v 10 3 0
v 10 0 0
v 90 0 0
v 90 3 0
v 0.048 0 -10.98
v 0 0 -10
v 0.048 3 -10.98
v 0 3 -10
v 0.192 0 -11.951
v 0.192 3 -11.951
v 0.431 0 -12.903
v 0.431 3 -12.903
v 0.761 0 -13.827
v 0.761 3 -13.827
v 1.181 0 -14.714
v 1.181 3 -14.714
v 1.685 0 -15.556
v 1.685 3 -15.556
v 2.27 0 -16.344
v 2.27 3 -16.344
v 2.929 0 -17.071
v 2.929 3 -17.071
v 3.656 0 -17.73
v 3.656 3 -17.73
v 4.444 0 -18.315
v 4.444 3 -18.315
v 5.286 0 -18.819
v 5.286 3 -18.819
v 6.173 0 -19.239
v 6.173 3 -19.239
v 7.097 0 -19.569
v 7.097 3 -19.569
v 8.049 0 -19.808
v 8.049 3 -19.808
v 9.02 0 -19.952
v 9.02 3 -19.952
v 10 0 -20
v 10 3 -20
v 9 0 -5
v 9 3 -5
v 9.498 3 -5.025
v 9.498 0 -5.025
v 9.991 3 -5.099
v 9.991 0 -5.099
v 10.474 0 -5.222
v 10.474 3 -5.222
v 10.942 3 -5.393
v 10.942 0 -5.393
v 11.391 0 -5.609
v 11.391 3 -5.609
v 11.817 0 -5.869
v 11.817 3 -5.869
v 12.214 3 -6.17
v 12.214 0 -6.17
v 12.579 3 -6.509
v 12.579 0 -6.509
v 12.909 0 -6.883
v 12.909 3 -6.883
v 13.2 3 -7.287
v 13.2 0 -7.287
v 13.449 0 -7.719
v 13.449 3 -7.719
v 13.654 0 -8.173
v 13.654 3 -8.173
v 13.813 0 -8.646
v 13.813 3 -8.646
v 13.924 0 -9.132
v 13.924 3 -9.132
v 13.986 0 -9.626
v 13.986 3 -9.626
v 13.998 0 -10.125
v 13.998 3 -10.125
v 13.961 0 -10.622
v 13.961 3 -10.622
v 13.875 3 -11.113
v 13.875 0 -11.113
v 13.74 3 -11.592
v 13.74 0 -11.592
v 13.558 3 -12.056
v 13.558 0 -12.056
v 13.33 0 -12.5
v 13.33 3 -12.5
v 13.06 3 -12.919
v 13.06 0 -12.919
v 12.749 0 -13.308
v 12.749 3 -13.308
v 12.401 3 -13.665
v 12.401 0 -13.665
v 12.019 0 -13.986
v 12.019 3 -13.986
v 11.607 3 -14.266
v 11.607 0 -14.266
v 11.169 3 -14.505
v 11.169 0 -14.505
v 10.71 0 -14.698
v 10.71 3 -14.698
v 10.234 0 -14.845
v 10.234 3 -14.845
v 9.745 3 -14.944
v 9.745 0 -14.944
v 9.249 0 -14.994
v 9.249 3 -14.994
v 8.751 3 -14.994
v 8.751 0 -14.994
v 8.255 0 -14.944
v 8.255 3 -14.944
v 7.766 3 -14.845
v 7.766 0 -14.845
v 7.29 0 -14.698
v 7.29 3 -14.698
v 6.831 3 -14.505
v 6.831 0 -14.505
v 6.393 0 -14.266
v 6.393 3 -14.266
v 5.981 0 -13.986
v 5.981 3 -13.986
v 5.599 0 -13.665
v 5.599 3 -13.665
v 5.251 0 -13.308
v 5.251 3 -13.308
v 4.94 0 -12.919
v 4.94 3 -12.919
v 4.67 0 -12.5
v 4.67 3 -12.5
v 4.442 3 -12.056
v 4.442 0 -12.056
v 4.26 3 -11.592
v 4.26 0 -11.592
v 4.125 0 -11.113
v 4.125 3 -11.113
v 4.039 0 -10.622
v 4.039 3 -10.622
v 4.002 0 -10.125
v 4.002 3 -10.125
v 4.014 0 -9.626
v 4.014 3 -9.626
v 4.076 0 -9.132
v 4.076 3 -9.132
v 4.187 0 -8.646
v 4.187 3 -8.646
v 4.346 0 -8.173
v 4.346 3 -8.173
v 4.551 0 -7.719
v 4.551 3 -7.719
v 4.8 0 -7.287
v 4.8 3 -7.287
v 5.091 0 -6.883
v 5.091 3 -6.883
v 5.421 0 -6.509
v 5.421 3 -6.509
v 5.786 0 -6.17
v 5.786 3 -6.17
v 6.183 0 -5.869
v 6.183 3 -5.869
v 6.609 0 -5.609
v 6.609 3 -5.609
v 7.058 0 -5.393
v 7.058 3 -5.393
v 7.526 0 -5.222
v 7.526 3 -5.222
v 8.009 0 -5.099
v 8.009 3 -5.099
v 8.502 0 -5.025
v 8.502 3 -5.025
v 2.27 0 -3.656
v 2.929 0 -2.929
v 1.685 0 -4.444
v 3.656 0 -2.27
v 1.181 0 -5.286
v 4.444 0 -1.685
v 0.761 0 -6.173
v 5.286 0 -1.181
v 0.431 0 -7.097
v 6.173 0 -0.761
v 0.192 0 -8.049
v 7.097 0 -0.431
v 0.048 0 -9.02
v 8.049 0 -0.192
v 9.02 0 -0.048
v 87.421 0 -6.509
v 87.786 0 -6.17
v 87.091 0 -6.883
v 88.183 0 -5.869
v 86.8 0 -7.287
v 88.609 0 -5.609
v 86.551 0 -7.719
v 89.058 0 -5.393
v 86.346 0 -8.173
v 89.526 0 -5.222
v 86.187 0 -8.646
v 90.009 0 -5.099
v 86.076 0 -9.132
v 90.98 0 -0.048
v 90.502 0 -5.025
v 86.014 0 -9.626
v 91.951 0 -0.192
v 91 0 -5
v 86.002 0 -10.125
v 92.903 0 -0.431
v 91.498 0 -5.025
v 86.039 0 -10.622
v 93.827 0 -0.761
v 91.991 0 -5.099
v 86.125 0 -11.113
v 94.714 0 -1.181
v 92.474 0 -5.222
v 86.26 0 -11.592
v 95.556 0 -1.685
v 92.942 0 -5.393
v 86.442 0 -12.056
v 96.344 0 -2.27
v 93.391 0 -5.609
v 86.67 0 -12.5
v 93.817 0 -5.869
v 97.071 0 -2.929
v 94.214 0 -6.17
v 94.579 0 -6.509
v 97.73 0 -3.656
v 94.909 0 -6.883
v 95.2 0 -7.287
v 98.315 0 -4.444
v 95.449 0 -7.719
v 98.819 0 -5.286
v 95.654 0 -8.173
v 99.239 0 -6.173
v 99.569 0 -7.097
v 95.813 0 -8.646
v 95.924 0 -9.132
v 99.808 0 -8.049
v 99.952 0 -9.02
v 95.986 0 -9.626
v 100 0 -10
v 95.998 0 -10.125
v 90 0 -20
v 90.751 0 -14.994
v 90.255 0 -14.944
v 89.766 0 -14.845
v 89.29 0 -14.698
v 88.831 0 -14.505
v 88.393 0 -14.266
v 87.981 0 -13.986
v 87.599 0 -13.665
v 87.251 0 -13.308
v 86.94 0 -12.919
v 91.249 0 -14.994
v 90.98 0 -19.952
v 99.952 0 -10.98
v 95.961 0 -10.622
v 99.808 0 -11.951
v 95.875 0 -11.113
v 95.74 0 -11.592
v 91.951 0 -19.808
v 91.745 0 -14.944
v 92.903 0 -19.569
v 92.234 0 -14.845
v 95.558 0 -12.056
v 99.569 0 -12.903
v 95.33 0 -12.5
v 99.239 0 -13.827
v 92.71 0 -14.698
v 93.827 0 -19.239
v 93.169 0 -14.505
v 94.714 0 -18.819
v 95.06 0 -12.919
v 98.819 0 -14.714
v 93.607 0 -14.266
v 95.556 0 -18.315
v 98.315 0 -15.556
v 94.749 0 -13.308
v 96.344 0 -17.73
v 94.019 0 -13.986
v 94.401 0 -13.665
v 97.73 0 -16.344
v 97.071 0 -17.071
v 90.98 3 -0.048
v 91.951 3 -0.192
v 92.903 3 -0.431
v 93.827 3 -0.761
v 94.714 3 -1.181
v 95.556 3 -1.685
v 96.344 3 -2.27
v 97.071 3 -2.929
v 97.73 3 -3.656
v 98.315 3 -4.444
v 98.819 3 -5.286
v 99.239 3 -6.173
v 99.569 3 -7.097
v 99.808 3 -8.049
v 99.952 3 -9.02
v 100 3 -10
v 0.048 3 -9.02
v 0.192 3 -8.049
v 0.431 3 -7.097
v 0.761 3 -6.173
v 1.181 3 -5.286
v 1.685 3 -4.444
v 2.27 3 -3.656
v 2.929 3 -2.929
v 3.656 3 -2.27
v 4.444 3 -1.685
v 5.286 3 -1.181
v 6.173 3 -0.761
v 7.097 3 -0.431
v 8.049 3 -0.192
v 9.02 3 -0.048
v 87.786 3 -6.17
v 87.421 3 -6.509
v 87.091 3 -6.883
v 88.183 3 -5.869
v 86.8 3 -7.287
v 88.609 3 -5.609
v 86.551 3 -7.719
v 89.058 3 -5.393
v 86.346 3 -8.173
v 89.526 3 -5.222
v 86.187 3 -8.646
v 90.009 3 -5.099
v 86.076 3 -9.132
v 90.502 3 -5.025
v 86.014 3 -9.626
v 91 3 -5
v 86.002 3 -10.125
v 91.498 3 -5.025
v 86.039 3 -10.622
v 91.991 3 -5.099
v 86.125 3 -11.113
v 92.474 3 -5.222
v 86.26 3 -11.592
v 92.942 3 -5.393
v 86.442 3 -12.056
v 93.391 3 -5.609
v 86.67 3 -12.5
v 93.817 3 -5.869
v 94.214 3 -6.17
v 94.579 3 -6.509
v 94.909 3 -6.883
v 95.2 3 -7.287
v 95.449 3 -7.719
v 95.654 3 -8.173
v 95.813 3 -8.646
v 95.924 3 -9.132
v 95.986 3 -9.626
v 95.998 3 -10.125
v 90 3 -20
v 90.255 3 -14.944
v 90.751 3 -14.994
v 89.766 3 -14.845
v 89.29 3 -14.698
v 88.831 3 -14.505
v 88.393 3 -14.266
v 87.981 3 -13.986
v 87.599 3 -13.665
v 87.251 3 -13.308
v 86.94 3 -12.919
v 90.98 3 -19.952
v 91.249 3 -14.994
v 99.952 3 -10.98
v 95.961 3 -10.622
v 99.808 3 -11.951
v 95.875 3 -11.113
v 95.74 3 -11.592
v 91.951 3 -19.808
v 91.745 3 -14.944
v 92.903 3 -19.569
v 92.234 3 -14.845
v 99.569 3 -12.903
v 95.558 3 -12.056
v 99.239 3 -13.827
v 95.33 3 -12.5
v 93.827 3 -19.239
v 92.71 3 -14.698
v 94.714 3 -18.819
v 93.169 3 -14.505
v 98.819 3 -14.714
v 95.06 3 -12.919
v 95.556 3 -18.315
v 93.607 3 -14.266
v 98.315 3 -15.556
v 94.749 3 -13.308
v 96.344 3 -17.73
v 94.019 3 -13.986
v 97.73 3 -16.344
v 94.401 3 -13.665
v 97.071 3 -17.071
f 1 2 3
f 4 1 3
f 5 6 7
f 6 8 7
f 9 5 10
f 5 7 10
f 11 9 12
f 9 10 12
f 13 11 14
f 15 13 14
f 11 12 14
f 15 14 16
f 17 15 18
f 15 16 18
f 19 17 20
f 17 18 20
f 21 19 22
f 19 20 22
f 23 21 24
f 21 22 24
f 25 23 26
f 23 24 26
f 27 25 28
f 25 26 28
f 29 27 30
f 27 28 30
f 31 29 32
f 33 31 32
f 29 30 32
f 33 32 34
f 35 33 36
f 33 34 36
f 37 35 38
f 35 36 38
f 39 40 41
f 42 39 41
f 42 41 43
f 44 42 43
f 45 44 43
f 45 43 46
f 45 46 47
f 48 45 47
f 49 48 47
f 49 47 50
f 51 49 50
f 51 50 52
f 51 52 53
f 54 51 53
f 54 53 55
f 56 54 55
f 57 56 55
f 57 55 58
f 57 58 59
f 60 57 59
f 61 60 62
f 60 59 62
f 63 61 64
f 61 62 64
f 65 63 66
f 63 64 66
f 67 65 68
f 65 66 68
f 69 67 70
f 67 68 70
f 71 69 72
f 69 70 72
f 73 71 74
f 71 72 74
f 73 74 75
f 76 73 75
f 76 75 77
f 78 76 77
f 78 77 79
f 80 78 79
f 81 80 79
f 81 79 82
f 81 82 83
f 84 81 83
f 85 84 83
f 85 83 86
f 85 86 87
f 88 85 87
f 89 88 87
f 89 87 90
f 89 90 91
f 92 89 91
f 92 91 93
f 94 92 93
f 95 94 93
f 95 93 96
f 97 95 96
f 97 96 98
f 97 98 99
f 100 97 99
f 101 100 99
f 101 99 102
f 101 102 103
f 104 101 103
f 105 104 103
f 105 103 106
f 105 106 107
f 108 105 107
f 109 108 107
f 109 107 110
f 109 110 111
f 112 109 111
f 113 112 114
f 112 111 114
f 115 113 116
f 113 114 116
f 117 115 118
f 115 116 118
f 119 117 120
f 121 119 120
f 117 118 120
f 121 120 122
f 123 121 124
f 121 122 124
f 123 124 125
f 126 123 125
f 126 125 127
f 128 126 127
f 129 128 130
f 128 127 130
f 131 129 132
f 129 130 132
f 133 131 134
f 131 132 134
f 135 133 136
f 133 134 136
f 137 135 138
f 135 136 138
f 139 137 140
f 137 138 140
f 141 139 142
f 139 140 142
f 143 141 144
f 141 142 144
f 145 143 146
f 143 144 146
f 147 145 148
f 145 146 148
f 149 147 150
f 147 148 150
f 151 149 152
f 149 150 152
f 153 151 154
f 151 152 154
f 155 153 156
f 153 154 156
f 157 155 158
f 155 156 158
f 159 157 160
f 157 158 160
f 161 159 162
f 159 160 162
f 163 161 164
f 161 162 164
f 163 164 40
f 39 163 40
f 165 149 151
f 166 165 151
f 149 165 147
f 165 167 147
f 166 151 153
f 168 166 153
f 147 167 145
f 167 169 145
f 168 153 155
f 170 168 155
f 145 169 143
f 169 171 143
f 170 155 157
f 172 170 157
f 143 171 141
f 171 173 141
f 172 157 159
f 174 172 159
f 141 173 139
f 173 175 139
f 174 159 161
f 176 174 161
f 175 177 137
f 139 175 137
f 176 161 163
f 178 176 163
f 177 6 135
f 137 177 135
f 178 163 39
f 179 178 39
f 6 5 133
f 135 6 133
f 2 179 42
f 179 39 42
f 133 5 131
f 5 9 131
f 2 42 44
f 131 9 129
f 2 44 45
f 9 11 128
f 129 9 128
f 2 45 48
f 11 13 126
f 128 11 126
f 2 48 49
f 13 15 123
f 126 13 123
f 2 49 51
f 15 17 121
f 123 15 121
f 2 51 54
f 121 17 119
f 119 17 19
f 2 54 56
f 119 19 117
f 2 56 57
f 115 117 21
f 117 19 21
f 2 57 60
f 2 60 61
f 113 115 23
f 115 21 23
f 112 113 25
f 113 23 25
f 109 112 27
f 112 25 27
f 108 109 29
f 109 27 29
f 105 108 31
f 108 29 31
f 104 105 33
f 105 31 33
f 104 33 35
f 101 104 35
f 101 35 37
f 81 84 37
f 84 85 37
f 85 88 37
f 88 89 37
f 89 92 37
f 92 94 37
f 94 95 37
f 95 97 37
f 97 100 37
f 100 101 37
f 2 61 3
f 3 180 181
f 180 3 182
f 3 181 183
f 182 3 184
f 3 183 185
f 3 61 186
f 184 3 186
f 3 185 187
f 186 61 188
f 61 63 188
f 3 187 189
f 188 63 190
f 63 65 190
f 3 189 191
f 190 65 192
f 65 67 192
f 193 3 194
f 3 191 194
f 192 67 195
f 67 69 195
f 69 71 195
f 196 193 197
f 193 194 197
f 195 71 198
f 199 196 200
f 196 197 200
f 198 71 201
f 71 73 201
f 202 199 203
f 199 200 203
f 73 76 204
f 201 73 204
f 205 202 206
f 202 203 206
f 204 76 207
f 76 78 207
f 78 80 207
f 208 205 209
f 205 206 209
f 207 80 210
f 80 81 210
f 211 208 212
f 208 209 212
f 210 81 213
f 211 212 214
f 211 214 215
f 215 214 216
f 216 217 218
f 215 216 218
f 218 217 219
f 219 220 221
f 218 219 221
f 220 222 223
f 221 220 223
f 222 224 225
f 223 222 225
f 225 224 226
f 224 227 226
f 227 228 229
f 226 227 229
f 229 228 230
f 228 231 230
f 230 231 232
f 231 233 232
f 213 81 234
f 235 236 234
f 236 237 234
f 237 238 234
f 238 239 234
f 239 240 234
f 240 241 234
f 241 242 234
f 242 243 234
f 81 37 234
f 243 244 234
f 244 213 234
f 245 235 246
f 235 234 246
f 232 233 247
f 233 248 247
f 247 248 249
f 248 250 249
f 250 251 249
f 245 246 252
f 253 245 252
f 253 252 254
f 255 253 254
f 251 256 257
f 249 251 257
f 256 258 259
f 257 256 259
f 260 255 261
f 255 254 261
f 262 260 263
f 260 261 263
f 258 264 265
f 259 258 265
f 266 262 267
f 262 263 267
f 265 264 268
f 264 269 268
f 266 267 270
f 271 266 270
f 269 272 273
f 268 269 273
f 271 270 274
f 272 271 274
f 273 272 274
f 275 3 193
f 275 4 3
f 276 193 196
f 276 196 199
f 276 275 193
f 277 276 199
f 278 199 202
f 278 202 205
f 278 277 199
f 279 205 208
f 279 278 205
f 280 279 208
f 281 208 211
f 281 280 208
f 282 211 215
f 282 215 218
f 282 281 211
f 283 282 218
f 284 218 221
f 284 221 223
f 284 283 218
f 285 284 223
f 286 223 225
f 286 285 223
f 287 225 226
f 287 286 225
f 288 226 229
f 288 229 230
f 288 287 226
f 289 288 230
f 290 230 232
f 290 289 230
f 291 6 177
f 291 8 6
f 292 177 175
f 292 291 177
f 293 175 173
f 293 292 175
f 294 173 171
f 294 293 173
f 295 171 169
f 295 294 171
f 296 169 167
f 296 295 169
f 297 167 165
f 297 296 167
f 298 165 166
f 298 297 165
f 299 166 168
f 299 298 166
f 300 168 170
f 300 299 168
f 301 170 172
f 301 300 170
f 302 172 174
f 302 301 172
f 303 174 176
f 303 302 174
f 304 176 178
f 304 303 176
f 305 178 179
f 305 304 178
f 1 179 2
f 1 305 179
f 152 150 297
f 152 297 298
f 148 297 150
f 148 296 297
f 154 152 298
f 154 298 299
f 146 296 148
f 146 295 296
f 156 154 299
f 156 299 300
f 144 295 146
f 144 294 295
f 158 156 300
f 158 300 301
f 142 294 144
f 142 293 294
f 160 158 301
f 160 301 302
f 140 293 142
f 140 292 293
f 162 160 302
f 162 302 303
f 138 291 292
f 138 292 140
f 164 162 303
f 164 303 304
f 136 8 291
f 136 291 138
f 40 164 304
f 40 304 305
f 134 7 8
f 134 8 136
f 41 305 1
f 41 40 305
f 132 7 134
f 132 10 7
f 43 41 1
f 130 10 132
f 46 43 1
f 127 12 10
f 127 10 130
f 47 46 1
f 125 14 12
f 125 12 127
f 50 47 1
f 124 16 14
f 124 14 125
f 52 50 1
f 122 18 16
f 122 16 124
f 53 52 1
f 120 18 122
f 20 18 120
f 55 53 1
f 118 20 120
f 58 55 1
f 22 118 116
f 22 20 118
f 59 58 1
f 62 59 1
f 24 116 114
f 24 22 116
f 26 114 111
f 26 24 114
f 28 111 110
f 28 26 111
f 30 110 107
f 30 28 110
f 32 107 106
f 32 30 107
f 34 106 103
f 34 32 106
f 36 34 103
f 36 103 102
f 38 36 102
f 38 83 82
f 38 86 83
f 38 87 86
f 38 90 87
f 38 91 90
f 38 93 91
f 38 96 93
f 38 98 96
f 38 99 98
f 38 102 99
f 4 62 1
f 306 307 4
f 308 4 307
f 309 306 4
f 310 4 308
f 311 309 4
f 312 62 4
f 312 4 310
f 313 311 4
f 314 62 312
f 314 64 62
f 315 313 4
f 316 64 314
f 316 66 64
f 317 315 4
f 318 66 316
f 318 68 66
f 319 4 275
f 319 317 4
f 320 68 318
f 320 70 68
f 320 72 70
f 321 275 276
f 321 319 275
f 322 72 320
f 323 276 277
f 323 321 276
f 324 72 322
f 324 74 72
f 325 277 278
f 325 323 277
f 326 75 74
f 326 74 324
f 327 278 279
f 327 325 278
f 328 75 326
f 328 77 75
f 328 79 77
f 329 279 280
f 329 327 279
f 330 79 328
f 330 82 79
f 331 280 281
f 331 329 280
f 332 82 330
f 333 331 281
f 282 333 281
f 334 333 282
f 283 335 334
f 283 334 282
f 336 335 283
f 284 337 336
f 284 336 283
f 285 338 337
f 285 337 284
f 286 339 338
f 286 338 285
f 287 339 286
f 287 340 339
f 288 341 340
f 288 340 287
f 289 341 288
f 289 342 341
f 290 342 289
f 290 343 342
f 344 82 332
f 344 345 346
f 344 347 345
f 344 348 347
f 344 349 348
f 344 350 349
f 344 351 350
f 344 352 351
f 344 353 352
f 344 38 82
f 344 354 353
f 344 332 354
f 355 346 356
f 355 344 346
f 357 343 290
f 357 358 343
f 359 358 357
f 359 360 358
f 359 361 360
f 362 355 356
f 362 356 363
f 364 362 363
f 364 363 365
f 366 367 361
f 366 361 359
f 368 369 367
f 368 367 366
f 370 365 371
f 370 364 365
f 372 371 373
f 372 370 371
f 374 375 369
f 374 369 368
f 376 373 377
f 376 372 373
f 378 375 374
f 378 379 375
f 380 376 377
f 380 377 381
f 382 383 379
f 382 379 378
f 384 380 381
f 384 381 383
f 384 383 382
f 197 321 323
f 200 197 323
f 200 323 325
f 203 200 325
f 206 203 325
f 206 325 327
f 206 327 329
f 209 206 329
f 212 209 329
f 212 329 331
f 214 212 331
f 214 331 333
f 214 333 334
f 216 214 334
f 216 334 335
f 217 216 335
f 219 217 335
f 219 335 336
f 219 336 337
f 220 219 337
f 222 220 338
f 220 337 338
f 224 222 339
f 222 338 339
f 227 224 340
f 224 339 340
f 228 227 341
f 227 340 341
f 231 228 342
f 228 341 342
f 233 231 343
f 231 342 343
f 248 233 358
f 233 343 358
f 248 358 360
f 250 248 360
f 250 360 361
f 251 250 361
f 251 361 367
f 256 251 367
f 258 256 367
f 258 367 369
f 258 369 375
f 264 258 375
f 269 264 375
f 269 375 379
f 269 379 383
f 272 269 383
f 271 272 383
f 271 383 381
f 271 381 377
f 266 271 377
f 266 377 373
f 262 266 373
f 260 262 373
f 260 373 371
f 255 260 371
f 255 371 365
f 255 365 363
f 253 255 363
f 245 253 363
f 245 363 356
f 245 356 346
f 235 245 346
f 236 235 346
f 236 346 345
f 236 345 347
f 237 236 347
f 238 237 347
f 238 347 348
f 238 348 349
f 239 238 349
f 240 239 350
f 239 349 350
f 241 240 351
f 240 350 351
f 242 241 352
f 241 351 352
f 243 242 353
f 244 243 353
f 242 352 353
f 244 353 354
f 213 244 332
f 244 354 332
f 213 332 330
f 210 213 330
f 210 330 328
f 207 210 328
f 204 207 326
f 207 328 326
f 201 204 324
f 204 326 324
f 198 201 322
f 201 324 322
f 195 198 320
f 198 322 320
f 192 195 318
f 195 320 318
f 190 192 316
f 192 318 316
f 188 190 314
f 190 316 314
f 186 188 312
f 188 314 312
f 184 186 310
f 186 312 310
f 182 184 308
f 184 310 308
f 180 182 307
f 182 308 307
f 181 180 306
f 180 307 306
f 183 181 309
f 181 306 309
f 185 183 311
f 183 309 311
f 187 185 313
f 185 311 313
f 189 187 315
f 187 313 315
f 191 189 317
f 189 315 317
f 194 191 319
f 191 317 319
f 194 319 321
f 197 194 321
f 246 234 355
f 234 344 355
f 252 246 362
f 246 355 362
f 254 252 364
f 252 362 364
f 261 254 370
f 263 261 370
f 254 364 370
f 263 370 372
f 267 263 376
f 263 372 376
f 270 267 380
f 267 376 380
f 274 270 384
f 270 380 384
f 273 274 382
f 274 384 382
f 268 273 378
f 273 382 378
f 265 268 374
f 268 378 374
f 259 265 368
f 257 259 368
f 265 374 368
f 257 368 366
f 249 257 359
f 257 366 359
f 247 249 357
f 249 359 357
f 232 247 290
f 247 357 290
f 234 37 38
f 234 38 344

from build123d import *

# Parameters (mm, degrees)
SKETCH2_W           = 100
SKETCH2_H           = 20
BOSS_EXTRUDE1_DEPTH = 3
SKETCH3_R           = 5
CUT_EXTRUDE1_DEPTH  = 103.02450686
SKETCH4_R           = 5
CUT_EXTRUDE2_DEPTH  = 103.02450686
FILLET1_R           = 10
FILLET2_R           = 10


with BuildPart() as part:
    # Sketch2 → Boss-Extrude1 (new body)
    with BuildSketch(Plane(origin=(0, 0, 0), x_dir=(1, 0, 0), z_dir=(0, 1, 0))):
        with Locations((50, 10)):
            Rectangle(SKETCH2_W, SKETCH2_H)
    extrude(amount=BOSS_EXTRUDE1_DEPTH)

    # Sketch3 → Cut-Extrude1 (cut, through all)
    with BuildSketch(Plane(origin=(0, 3, 0), x_dir=(1, 0, 0), z_dir=(0, 1, 0))):
        with Locations(Location((9, 10, 0), (0, 0, 270))):
            Circle(SKETCH3_R)
    extrude(amount=-CUT_EXTRUDE1_DEPTH, mode=Mode.SUBTRACT)

    # Sketch4 → Cut-Extrude2 (cut, through all)
    with BuildSketch(Plane(origin=(0, 3, 0), x_dir=(1, 0, 0), z_dir=(0, 1, 0))):
        with Locations(Location((91, 10, 0), (0, 0, 270))):
            Circle(SKETCH4_R)
    extrude(amount=-CUT_EXTRUDE2_DEPTH, mode=Mode.SUBTRACT)

    # Fillet1
    fillet1_edges = [part.edges().sort_by_distance(p)[0] for p in [
        (0, 1.5, -20),
        (0, 1.5, 0),
    ]]
    fillet(fillet1_edges, radius=FILLET1_R - 0.0001)  # a hair under: the kernel refuses the full size

    # Fillet2
    fillet2_edges = [part.edges().sort_by_distance(p)[0] for p in [
        (100, 1.5, -20),
        (100, 1.5, 0),
    ]]
    fillet(fillet2_edges, radius=FILLET2_R - 0.0001)  # a hair under: the kernel refuses the full size


solid = part.part
